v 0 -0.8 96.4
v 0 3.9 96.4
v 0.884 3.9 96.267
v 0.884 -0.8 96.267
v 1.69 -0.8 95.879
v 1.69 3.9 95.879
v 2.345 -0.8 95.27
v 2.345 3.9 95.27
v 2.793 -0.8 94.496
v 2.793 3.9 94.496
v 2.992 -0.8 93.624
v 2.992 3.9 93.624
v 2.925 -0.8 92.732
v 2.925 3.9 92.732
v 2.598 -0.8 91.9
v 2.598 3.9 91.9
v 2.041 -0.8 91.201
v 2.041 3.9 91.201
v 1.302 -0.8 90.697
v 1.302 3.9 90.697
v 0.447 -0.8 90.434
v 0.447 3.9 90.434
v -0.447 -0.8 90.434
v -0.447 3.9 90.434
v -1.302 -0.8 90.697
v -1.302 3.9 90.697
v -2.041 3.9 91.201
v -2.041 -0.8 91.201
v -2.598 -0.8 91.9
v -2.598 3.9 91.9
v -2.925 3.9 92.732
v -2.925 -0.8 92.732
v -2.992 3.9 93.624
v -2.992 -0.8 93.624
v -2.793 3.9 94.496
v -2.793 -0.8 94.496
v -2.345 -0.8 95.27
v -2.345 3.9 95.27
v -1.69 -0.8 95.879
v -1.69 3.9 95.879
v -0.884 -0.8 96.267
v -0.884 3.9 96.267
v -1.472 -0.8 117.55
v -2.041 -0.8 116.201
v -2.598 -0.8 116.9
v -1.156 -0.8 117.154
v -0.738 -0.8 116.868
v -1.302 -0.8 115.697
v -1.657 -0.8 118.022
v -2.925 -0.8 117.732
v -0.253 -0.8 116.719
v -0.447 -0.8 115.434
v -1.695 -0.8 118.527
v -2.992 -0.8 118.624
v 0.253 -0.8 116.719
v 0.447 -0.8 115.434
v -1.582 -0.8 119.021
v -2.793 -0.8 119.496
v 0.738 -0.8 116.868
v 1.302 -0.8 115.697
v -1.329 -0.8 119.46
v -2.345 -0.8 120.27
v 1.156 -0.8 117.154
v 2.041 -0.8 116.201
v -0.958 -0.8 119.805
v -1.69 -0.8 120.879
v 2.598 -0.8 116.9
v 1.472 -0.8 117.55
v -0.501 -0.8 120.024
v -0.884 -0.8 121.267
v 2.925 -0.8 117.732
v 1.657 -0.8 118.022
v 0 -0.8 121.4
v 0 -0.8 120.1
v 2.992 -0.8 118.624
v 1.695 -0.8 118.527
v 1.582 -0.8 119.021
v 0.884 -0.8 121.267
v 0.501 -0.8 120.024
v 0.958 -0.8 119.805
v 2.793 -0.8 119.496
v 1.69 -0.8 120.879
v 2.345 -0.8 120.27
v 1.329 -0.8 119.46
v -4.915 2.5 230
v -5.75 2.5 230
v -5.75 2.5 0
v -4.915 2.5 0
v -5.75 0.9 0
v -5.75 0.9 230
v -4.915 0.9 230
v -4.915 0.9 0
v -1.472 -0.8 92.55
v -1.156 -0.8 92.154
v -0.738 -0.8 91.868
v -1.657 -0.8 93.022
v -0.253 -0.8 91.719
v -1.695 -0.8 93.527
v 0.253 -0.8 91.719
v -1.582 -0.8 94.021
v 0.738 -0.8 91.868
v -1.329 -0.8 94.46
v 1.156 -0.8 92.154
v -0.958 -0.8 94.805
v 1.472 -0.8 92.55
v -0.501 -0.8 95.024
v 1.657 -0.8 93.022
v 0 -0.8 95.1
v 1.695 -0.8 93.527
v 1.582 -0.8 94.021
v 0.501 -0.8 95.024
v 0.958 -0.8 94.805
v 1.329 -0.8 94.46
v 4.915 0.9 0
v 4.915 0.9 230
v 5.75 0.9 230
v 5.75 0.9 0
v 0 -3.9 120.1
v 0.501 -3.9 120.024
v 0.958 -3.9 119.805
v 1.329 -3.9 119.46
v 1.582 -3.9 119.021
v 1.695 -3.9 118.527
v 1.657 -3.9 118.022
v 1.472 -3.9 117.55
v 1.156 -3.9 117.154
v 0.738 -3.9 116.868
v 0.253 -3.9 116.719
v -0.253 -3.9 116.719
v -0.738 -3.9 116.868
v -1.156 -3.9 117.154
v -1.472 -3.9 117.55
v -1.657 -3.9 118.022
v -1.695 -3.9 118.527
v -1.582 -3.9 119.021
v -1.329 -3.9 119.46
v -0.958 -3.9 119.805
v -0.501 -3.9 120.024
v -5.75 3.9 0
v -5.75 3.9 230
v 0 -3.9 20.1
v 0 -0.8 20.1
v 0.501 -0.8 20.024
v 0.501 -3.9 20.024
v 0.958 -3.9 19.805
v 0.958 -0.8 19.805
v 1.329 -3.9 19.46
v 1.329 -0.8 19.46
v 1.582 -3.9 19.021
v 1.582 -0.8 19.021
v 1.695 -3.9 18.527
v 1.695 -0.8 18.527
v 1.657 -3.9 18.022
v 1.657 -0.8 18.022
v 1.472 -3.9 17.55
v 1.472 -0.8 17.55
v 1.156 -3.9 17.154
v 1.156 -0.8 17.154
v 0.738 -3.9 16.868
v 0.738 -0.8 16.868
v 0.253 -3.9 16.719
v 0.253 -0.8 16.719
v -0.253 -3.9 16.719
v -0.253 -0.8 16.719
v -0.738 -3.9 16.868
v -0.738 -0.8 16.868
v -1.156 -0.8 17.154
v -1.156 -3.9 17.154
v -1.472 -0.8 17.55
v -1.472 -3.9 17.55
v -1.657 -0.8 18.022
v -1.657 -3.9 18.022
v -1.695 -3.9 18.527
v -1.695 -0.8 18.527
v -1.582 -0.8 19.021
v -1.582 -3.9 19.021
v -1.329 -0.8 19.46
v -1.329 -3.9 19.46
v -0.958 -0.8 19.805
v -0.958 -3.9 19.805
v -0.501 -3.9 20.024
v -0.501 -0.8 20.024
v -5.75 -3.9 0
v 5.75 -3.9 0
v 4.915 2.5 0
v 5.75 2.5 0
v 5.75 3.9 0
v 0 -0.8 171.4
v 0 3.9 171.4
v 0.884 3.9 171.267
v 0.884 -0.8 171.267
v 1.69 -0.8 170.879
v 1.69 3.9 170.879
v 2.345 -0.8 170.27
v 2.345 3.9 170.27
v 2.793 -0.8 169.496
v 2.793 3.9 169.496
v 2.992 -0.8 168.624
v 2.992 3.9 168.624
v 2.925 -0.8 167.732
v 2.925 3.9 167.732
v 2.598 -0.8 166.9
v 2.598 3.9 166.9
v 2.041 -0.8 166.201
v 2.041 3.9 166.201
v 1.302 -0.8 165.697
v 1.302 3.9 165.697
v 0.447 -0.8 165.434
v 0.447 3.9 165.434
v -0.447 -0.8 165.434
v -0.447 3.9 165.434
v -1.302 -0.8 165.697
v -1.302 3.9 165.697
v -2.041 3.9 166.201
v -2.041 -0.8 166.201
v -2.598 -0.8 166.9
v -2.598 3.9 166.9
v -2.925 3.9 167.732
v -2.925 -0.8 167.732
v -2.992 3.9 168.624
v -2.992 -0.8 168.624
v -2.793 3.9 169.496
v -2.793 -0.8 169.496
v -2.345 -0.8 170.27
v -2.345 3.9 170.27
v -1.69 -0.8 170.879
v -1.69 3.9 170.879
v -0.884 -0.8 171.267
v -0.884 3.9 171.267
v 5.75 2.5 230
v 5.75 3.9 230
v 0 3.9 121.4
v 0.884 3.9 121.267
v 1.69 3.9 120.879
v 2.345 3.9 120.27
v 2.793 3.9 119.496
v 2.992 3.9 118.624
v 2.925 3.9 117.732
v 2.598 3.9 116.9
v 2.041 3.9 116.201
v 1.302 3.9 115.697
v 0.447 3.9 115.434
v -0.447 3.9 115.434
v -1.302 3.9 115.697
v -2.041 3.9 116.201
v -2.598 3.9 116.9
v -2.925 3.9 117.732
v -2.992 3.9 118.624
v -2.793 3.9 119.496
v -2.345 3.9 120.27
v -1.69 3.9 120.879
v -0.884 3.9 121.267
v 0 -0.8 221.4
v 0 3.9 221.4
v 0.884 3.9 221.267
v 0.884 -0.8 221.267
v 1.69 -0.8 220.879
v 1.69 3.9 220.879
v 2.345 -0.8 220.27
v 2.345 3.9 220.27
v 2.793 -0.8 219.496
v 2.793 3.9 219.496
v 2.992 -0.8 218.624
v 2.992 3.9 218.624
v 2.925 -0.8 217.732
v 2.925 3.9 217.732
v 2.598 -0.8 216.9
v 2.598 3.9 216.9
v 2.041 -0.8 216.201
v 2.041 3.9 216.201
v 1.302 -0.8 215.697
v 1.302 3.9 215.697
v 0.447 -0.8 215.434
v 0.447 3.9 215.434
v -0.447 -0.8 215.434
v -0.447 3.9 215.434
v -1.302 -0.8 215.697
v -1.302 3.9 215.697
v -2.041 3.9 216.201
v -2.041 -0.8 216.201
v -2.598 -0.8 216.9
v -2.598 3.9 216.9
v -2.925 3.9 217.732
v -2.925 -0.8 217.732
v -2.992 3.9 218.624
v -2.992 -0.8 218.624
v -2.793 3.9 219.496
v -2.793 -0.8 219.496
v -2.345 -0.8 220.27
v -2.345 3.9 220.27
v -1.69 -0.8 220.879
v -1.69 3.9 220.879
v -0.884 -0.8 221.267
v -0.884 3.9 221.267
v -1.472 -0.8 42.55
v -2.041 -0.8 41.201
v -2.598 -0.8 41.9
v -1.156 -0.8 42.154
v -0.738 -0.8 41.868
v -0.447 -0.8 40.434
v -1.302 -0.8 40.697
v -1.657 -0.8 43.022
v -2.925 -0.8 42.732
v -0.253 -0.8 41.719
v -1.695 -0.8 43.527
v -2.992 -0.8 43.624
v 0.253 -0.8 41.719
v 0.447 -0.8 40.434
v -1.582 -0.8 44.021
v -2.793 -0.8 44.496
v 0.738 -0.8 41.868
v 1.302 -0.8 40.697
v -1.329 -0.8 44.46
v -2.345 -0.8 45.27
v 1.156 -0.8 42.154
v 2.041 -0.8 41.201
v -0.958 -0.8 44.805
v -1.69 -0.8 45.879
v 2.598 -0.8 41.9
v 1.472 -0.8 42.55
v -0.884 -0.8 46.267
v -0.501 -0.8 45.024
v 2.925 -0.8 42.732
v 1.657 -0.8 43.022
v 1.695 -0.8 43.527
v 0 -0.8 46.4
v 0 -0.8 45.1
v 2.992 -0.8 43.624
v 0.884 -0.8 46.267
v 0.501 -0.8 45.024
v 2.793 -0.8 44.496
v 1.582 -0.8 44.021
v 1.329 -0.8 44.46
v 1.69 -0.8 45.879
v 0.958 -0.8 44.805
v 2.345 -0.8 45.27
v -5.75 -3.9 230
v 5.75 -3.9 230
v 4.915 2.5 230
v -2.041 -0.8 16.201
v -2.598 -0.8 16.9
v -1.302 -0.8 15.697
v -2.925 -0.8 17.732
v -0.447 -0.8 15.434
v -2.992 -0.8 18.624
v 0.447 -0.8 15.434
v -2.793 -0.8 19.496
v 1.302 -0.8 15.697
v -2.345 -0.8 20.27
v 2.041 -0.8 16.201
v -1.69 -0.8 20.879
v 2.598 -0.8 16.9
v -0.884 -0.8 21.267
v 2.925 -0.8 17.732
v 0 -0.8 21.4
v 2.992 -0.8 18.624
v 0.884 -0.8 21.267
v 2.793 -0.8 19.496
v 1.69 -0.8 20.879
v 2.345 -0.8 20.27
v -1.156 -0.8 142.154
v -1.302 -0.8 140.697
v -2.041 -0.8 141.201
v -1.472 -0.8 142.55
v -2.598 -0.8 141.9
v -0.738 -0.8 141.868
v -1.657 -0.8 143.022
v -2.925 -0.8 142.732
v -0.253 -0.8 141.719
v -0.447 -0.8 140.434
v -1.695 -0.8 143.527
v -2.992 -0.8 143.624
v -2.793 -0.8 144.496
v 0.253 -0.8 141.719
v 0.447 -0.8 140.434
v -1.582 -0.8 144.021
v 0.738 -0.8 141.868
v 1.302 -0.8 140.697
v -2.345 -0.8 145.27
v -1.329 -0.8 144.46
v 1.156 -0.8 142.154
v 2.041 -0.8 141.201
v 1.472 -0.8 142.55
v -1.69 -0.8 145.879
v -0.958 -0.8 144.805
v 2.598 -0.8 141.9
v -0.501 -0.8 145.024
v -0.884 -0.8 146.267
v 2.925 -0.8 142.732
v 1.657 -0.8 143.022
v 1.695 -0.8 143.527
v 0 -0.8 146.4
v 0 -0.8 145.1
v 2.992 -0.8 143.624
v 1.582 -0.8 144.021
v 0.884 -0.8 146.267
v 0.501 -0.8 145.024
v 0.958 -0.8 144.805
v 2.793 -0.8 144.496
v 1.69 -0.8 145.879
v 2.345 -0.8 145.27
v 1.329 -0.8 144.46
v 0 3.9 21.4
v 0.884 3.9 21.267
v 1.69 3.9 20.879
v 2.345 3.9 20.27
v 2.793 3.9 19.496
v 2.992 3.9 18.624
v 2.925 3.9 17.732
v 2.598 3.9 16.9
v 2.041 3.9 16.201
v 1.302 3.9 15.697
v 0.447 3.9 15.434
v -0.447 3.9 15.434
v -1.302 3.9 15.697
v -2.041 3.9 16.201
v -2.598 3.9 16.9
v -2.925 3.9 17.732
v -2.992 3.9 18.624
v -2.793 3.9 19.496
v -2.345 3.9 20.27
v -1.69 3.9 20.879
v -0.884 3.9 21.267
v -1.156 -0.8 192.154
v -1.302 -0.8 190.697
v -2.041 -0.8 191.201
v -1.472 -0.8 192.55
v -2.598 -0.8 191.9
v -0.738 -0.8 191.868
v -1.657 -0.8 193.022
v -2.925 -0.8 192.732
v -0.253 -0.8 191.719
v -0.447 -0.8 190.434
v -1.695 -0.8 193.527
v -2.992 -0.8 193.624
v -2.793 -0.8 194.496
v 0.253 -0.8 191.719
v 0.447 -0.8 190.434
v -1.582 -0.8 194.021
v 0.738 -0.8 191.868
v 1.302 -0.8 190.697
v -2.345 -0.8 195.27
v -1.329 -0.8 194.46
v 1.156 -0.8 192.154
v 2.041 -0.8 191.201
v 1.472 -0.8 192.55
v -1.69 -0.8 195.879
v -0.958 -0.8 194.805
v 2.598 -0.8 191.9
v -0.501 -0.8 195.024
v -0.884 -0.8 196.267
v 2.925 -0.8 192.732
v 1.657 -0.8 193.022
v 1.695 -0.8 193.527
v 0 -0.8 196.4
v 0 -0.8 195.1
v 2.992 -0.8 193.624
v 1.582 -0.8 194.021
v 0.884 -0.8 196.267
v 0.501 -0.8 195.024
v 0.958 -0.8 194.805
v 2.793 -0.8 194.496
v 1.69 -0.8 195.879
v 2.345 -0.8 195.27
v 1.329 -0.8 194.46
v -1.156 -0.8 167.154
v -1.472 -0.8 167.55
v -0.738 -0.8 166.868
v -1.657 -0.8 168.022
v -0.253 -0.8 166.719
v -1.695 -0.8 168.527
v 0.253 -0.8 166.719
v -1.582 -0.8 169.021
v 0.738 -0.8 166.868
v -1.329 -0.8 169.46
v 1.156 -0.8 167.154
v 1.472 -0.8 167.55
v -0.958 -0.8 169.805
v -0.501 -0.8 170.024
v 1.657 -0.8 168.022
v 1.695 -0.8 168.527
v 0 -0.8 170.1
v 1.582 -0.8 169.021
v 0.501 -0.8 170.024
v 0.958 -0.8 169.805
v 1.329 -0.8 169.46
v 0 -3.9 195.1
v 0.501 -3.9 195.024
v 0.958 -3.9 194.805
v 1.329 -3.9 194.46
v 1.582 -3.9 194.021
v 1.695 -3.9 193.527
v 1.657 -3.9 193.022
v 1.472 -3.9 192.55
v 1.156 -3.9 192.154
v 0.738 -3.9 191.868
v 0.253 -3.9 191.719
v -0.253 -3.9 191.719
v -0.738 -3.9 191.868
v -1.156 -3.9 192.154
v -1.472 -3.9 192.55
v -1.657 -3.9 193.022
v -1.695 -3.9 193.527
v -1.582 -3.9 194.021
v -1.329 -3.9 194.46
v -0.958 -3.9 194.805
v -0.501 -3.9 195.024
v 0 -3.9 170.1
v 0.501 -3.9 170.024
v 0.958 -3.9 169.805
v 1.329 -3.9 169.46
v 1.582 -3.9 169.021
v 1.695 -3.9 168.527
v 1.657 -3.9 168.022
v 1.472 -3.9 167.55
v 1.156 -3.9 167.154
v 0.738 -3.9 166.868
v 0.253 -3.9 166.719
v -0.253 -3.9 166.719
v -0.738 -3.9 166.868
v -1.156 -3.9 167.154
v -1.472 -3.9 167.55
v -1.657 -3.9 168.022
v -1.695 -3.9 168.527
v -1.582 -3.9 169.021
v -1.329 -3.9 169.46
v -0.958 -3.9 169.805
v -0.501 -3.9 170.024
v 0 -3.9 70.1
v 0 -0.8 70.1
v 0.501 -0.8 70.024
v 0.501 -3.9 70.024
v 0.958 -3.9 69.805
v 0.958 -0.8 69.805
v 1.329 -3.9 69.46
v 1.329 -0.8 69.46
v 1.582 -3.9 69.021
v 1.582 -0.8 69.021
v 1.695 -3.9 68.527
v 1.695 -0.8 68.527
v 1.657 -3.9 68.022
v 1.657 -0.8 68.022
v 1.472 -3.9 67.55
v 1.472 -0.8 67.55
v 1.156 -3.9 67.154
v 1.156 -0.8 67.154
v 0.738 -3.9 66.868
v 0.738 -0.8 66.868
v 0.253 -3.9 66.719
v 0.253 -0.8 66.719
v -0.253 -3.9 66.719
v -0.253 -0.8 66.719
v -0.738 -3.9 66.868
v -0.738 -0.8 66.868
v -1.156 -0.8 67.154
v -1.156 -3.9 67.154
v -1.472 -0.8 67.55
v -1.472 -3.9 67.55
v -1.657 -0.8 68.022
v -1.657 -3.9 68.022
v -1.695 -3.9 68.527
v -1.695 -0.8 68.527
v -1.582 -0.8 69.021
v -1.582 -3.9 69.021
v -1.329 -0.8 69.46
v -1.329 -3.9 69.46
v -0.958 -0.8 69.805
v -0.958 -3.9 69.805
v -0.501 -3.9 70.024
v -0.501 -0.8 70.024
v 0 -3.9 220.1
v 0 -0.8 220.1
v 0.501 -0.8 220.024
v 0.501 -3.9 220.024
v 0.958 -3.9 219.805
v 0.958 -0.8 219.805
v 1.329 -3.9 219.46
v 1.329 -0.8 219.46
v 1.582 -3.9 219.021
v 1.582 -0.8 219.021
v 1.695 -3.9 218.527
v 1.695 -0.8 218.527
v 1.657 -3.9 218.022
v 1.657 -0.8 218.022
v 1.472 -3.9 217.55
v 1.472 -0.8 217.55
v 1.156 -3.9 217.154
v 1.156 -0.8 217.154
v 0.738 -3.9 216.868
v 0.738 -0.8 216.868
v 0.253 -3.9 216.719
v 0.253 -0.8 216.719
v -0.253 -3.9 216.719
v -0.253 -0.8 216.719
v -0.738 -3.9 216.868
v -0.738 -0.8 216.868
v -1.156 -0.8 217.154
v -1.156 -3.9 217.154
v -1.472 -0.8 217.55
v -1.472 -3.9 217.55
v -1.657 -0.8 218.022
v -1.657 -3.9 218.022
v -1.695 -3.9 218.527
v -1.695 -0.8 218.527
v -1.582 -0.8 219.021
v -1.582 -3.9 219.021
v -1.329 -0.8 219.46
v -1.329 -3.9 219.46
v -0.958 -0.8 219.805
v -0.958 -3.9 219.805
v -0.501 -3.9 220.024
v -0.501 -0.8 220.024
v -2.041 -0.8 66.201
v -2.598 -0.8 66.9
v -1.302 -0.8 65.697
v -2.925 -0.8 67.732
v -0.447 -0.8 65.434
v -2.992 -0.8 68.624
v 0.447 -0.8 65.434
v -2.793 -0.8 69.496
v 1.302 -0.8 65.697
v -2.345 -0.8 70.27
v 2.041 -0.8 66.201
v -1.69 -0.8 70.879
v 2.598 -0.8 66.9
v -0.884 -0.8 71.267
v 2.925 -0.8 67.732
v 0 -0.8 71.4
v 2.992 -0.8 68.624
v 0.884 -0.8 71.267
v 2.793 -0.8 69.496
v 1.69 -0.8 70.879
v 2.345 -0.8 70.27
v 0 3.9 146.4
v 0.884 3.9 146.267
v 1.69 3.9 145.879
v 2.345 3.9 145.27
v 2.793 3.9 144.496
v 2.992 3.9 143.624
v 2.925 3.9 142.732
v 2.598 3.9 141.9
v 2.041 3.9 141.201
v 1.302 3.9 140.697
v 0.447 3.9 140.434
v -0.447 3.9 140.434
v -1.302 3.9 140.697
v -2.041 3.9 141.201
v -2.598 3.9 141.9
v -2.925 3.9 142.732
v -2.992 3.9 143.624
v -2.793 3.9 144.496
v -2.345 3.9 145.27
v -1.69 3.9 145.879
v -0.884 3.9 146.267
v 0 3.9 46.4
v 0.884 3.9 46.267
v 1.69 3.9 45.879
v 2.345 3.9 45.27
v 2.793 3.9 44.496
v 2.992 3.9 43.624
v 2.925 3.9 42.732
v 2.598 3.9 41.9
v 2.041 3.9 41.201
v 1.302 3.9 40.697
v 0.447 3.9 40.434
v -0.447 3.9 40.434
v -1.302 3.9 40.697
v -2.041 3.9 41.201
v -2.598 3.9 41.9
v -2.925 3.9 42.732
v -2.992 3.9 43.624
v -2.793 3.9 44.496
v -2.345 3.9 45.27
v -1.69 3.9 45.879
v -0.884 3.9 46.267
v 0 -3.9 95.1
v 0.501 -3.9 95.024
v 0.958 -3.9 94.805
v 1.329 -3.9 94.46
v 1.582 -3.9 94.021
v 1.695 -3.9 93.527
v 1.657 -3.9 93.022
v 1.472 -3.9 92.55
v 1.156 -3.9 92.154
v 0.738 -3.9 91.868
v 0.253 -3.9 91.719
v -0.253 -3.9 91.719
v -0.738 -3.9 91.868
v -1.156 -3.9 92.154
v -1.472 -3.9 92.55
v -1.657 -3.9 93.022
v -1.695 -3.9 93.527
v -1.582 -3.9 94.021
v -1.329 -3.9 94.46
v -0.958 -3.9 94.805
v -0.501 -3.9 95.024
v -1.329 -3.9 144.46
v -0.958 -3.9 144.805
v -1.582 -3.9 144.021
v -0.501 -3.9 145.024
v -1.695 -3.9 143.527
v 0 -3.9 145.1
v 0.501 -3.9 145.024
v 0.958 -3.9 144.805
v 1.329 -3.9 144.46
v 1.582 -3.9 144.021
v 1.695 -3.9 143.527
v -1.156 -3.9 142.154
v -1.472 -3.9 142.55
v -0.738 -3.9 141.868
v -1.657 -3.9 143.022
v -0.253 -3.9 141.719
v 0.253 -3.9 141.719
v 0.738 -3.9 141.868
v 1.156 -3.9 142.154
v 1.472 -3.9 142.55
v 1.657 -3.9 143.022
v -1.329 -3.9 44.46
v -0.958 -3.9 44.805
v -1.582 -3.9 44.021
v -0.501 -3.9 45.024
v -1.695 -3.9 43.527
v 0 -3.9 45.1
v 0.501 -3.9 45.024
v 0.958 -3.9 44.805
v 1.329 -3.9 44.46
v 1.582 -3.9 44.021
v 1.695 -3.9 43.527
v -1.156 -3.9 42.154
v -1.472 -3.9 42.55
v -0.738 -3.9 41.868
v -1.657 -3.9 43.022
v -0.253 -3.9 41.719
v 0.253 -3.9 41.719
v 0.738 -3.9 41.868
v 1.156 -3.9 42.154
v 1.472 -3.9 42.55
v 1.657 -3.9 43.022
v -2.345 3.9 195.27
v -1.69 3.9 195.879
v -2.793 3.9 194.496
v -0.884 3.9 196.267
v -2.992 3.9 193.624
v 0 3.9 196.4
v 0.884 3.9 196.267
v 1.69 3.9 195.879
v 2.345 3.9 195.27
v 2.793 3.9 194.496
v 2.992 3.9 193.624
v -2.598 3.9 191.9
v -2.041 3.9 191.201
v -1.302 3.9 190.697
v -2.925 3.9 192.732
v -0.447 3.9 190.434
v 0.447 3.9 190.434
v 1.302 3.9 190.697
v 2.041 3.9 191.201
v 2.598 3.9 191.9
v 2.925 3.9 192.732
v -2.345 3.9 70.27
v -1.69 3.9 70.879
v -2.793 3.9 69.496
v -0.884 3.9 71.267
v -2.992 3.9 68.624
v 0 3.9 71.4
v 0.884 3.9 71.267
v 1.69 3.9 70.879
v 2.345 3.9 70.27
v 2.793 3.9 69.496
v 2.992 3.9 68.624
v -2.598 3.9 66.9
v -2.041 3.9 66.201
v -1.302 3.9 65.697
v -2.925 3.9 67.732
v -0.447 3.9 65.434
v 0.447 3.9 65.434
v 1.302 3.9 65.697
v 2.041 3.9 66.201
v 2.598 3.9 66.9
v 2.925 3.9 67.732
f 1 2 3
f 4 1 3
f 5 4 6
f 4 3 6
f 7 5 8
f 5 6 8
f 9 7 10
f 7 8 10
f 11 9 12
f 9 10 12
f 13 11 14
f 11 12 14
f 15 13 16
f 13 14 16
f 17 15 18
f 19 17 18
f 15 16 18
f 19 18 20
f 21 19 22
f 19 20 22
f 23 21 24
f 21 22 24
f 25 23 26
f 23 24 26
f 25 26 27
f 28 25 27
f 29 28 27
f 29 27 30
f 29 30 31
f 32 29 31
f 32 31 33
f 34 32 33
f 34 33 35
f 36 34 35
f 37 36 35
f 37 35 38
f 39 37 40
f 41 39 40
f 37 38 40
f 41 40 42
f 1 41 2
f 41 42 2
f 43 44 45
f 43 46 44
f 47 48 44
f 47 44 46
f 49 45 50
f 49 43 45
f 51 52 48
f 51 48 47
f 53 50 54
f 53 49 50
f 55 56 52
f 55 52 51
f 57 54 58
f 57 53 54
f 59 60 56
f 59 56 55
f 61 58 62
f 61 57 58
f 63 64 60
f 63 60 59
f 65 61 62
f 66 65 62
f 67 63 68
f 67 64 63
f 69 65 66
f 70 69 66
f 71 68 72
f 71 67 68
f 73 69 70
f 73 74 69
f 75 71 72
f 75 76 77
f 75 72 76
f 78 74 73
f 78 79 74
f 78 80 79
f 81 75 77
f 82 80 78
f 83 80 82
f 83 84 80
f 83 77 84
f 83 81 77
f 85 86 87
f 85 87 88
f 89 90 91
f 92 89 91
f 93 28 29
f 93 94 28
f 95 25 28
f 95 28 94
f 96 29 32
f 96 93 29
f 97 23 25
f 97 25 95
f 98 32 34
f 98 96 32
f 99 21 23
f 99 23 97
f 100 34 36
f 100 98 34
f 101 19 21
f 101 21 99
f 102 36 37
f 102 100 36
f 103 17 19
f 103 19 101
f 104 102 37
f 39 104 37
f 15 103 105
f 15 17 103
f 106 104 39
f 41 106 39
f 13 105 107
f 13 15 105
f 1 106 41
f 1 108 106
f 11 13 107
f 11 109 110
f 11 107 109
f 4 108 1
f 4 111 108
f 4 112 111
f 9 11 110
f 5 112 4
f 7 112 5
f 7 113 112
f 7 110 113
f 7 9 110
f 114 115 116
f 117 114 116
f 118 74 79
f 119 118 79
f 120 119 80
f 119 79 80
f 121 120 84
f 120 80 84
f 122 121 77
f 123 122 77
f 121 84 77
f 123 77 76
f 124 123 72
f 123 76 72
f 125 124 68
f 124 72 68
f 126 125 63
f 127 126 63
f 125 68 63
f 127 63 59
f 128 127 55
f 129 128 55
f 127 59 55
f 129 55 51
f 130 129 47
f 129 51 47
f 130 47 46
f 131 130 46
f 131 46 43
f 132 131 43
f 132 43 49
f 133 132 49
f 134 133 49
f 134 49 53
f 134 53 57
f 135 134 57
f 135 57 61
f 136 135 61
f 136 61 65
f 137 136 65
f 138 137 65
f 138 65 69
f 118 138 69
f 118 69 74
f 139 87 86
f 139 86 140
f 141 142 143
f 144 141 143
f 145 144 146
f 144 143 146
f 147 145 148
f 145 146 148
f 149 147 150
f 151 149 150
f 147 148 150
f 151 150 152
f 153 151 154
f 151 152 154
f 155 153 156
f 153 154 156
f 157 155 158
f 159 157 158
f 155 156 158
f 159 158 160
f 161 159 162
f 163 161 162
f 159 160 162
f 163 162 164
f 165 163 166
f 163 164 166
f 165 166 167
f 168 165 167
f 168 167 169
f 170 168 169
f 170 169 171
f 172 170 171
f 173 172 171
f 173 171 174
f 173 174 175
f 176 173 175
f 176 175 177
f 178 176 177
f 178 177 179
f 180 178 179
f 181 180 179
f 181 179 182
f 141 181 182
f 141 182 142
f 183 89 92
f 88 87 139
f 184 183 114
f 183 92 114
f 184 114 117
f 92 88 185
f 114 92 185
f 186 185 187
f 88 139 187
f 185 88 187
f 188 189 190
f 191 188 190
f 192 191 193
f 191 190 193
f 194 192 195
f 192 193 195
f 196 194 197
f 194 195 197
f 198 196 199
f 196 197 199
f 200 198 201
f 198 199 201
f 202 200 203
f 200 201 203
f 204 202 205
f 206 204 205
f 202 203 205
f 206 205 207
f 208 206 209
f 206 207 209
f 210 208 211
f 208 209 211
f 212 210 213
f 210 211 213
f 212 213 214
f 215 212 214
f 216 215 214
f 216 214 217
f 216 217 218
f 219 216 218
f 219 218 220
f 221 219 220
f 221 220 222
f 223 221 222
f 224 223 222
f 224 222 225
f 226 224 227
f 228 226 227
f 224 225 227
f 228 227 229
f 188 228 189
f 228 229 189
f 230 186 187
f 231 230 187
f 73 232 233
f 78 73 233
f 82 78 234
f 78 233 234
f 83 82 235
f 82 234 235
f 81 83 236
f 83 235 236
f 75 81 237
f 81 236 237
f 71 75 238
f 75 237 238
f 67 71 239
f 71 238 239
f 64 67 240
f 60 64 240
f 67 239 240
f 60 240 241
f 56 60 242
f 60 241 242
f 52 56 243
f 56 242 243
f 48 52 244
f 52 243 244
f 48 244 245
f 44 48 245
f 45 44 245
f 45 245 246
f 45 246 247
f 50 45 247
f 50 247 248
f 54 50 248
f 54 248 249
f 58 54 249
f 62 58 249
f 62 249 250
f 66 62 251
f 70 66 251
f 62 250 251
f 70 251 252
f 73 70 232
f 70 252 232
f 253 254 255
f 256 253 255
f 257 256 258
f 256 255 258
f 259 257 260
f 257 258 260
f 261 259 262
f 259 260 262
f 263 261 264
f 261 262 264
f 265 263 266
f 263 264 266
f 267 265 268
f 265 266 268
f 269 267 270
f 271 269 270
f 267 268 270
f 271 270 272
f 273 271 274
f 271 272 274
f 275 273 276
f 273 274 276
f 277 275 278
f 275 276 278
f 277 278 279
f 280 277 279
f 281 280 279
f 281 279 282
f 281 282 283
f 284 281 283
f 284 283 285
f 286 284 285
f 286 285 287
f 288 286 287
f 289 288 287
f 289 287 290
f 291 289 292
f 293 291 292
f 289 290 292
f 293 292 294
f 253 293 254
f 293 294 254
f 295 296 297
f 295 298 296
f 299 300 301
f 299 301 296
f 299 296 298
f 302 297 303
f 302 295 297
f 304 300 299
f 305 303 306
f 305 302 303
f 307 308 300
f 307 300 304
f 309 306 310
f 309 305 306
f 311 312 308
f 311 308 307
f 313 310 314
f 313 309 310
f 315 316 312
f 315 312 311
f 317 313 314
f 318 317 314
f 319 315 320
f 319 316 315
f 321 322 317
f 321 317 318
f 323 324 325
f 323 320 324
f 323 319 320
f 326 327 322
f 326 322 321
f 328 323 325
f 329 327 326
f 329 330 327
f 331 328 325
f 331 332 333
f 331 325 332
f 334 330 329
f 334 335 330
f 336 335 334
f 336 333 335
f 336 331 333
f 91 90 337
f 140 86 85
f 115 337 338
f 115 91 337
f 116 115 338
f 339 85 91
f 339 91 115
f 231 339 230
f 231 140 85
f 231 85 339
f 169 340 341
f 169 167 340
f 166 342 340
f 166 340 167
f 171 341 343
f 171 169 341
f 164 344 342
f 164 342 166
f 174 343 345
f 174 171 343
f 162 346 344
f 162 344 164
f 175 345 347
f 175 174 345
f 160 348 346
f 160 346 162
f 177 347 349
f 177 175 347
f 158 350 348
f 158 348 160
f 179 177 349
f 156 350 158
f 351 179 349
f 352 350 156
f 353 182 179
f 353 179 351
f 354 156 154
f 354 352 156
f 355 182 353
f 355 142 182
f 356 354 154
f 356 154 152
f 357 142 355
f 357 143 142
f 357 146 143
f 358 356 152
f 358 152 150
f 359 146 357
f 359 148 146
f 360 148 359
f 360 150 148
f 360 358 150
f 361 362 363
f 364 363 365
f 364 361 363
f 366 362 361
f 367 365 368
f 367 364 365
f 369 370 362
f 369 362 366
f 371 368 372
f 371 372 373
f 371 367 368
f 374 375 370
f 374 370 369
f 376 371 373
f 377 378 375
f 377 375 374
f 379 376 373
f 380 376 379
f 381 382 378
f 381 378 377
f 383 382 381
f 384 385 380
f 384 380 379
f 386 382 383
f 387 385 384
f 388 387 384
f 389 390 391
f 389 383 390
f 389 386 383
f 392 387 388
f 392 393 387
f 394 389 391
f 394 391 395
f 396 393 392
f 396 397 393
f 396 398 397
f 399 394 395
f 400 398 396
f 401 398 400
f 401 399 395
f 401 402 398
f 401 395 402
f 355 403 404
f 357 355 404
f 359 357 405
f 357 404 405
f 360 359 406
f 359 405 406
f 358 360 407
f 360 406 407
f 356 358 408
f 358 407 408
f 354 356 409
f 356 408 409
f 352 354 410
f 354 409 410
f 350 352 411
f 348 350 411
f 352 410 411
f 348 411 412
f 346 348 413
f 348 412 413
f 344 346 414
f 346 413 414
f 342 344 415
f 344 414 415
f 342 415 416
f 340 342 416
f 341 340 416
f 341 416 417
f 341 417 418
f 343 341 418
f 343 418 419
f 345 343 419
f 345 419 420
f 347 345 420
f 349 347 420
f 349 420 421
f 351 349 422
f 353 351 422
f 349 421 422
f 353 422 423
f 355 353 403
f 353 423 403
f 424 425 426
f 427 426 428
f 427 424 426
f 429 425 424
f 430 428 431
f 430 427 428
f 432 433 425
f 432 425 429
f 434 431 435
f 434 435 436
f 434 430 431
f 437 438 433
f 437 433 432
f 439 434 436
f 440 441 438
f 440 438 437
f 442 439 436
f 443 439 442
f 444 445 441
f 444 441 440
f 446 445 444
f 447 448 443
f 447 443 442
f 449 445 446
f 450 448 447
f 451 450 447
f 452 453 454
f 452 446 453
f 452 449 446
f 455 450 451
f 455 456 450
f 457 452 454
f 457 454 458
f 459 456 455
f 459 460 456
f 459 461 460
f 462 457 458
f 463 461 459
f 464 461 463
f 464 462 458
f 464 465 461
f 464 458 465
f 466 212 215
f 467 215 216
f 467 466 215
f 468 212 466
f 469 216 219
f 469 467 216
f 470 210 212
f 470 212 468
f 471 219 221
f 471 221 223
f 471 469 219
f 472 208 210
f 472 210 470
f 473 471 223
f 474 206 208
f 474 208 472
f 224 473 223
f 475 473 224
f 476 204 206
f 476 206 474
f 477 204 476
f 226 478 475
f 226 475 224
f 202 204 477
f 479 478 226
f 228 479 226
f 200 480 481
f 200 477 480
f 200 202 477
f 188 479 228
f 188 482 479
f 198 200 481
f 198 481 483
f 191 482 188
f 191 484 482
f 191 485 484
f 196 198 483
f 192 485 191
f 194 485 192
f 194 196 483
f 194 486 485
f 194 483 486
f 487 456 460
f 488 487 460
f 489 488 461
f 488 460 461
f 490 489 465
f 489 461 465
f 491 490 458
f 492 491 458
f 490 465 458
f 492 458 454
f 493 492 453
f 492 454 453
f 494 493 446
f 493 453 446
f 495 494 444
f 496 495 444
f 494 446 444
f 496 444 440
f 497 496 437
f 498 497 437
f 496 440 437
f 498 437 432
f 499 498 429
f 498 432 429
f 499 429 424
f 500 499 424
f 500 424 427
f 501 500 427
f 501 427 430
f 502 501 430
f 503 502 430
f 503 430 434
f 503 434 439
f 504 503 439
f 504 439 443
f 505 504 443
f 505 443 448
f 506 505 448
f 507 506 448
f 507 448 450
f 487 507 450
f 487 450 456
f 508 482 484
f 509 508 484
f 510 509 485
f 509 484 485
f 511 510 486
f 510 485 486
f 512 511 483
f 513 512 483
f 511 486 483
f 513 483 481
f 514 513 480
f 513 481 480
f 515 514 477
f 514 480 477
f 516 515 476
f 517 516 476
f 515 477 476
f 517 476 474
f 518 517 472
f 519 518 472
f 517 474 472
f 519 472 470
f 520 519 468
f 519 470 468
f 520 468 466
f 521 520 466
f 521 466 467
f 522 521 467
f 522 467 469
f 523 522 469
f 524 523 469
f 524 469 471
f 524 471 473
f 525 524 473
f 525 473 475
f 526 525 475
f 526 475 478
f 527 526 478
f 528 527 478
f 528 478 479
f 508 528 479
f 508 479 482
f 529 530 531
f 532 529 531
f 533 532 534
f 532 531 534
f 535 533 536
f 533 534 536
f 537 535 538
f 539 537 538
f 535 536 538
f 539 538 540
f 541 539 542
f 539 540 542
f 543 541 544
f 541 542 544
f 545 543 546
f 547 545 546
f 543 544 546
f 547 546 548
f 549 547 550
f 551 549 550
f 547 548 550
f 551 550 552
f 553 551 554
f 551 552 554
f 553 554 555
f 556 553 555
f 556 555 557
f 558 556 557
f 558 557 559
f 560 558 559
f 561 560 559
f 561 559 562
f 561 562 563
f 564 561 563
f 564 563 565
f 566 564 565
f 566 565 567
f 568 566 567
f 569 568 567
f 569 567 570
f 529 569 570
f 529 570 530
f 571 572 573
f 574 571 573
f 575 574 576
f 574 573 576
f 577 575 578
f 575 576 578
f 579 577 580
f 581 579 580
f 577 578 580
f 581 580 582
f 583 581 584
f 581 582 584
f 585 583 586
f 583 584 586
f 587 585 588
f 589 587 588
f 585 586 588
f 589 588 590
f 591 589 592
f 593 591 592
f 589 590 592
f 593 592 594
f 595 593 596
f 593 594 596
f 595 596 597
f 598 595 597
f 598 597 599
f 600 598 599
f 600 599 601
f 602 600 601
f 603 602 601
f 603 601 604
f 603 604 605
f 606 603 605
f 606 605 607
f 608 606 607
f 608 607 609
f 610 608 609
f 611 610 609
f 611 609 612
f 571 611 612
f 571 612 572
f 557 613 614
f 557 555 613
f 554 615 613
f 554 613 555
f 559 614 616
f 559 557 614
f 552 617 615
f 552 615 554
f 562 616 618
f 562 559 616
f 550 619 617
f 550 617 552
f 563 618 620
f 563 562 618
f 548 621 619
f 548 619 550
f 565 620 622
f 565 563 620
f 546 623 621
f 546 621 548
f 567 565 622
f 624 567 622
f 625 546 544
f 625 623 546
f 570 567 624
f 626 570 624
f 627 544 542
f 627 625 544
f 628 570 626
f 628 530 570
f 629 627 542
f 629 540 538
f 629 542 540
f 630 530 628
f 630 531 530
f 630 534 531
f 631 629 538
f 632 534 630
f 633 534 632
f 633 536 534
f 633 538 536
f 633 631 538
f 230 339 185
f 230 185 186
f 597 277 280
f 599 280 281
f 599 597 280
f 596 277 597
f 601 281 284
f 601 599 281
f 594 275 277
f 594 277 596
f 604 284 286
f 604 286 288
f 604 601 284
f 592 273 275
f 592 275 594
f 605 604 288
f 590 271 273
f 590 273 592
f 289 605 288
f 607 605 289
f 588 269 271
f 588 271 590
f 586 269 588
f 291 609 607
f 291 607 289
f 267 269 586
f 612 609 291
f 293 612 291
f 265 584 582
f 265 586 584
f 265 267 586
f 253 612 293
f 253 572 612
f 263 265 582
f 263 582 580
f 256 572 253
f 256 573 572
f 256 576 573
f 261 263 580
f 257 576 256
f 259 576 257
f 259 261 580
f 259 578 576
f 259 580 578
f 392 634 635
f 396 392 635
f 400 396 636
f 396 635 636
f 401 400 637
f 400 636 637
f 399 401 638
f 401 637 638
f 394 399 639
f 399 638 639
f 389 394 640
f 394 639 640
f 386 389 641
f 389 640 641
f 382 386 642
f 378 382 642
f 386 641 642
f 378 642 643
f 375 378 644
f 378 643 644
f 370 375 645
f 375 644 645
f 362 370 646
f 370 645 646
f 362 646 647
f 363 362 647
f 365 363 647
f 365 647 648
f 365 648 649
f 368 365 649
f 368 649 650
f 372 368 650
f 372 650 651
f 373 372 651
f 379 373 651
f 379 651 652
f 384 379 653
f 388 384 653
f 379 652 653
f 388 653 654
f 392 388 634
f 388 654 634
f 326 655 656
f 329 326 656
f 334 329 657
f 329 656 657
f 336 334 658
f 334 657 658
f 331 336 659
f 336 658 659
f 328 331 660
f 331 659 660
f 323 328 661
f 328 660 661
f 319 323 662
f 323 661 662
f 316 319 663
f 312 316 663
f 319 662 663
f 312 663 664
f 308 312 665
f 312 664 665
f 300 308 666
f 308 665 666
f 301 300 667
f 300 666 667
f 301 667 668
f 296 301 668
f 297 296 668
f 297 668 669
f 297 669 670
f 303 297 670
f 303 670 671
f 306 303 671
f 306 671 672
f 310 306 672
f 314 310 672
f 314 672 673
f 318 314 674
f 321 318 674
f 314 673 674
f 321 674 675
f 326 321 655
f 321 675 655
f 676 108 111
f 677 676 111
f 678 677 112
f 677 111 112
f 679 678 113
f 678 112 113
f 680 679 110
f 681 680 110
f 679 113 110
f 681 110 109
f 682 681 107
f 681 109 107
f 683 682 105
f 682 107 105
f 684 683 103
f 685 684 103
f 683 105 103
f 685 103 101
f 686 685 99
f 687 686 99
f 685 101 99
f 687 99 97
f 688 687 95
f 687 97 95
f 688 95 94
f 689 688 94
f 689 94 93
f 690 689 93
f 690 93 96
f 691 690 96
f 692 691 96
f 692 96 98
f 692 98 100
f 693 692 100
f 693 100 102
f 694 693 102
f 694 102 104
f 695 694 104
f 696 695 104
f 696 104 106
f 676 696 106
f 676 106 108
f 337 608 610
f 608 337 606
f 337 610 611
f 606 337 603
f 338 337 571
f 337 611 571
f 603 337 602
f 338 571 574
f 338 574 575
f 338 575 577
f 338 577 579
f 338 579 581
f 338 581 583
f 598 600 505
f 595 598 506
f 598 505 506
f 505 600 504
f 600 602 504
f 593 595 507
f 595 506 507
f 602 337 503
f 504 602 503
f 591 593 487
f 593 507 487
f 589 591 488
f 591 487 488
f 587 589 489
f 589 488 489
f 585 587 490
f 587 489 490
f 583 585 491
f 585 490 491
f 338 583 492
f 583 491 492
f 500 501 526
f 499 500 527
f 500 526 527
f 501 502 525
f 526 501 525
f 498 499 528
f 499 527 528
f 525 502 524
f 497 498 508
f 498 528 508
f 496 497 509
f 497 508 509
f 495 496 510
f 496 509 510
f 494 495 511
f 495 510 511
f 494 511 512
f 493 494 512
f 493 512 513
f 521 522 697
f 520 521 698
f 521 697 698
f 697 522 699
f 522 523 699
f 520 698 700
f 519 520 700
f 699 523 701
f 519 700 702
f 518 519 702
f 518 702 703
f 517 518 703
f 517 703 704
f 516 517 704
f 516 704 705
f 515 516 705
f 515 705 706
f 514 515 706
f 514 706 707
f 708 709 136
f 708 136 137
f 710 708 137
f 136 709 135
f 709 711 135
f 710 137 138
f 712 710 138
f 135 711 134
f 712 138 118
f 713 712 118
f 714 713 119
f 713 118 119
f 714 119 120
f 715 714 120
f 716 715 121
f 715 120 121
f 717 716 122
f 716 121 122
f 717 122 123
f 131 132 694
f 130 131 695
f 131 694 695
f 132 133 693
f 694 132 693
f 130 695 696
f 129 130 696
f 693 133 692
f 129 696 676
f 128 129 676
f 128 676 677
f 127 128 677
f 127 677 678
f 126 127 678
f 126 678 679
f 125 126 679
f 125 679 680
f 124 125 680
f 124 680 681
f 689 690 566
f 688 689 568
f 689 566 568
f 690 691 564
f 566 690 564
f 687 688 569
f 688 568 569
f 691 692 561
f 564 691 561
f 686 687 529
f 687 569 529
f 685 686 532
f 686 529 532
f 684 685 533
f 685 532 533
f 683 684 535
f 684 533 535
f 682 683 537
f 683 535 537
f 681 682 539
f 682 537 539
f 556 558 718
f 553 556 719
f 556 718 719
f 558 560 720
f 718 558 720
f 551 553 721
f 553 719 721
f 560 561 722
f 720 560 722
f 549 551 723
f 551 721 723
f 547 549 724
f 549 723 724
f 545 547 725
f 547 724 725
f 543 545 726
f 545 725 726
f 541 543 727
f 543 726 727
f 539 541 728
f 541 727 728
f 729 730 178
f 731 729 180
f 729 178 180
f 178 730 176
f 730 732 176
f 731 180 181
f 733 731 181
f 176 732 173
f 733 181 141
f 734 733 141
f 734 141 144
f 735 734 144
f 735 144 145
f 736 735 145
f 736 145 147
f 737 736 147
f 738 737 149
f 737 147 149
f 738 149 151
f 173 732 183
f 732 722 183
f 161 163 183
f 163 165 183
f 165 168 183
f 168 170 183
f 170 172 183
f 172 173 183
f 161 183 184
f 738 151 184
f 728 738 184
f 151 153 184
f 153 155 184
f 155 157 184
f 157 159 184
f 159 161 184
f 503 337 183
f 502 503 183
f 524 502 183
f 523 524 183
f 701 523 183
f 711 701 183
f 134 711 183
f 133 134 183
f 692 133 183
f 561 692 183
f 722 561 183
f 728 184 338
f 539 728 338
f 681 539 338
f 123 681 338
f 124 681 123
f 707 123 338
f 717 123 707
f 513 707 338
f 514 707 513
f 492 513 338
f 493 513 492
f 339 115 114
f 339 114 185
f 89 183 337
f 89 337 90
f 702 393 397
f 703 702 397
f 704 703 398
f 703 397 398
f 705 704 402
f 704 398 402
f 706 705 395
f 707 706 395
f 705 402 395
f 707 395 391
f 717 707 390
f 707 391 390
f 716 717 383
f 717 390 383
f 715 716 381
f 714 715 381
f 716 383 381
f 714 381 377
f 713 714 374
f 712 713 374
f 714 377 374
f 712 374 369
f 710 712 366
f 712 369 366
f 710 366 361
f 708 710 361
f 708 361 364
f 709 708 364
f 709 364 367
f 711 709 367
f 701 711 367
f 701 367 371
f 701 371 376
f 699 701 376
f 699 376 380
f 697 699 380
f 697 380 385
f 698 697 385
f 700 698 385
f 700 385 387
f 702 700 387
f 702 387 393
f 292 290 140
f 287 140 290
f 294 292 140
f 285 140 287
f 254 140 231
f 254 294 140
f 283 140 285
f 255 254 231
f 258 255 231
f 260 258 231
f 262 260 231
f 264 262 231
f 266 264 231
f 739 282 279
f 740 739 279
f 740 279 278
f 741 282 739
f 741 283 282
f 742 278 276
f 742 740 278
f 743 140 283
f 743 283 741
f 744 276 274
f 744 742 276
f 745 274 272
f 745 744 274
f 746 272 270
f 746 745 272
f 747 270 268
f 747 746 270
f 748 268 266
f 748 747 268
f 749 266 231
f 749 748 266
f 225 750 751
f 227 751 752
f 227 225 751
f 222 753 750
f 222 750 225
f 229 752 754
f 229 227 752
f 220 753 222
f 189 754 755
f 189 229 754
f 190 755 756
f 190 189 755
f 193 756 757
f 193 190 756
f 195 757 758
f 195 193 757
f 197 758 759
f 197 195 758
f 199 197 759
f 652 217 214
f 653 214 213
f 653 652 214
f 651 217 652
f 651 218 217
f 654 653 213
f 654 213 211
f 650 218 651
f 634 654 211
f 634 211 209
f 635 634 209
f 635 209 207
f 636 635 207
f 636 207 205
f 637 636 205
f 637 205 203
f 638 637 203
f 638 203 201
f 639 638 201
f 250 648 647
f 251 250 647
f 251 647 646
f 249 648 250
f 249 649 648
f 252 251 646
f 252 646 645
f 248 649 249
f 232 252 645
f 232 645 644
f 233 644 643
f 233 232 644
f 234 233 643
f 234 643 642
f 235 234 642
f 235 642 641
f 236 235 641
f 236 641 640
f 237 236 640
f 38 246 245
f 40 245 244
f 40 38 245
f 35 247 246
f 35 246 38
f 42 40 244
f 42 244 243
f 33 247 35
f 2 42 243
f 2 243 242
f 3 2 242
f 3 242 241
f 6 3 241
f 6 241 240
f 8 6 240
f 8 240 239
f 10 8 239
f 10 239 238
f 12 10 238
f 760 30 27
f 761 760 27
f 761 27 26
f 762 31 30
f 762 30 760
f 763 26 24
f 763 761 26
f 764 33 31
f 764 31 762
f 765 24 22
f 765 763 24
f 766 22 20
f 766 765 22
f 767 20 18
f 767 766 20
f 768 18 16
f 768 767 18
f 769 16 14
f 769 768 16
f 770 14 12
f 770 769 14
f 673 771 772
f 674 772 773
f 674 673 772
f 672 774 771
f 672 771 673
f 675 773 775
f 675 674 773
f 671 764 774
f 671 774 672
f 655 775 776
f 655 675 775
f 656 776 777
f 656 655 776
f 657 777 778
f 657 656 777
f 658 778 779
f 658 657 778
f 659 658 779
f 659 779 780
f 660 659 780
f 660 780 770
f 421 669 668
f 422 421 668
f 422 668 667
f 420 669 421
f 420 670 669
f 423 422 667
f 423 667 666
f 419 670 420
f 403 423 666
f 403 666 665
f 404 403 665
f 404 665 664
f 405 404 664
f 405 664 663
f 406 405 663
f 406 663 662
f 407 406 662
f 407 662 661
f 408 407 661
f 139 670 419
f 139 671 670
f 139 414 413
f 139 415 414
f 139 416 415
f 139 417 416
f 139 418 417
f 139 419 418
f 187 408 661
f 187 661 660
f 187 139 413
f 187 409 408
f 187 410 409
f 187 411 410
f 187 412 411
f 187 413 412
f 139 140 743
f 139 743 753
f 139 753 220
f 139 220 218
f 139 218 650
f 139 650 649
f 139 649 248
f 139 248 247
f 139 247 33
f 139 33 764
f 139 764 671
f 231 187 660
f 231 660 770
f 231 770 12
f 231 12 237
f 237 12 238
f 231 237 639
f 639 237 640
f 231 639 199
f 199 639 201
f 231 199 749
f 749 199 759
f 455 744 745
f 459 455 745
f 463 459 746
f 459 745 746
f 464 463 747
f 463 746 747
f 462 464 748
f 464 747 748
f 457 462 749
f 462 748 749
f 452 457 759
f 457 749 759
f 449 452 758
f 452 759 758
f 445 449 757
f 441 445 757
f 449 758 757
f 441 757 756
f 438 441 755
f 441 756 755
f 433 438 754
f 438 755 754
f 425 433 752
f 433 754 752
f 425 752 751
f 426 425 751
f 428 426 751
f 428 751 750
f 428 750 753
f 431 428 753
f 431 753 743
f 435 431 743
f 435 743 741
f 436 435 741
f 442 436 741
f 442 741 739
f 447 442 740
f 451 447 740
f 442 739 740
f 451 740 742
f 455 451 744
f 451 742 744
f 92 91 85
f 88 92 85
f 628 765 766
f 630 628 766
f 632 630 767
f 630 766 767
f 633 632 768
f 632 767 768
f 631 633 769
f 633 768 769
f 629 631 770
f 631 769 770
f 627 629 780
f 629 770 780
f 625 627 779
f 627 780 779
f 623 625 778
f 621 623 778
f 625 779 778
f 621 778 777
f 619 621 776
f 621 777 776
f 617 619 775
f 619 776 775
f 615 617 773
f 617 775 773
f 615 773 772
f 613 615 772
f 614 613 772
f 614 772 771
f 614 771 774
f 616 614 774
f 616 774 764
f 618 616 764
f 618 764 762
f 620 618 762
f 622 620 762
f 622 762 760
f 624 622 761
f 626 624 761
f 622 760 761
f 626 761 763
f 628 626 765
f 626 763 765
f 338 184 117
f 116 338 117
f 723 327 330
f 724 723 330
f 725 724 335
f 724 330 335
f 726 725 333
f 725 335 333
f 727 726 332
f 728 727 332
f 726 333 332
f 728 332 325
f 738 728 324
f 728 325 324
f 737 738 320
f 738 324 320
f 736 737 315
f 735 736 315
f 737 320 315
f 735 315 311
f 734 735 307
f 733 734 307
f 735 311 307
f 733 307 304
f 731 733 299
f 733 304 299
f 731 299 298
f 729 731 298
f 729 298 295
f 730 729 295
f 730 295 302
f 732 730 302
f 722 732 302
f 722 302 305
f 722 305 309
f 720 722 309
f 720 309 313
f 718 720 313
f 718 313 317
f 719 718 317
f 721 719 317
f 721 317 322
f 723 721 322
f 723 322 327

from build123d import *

# Parameters (mm, degrees)
SKETCH1_W           = 11.5
SKETCH1_H           = 7.8
BOSS_EXTRUDE1_DEPTH = 230
SKETCH2_W           = 0.835250229
SKETCH2_H           = 1.6
CUT_EXTRUDE1_DEPTH  = 231.104916288
SKETCH3_R           = 3
CUT_EXTRUDE2_DEPTH  = 4.7
SKETCH4_R           = 1.7
CUT_EXTRUDE3_DEPTH  = 231.119865505


with BuildPart() as part:
    # Sketch1 → Boss-Extrude1 (new body)
    with BuildSketch(Plane.XY):
        Rectangle(SKETCH1_W, SKETCH1_H)
    extrude(amount=BOSS_EXTRUDE1_DEPTH)

    # Sketch2 → Cut-Extrude1 (cut, through all)
    with BuildSketch(Plane.XY.offset(230)):
        with Locations((5.332374886, 1.7)):
            Rectangle(SKETCH2_W, SKETCH2_H)
        with Locations((-5.332374886, 1.7)):
            Rectangle(SKETCH2_W, SKETCH2_H)
    extrude(amount=-CUT_EXTRUDE1_DEPTH, mode=Mode.SUBTRACT)

    # Sketch3 → Cut-Extrude2 (cut)
    with BuildSketch(Plane(origin=(0, 3.9, 0), x_dir=(1, 0, 0), z_dir=(0, 1, 0))):
        with Locations(Location((0, -218.4, 0), (0, 0, 270))):
            Circle(SKETCH3_R)
        with Locations(Location((0, -193.4, 0), (0, 0, 270))):
            Circle(SKETCH3_R)
        with Locations(Location((0, -168.4, 0), (0, 0, 270))):
            Circle(SKETCH3_R)
        with Locations(Location((0, -143.4, 0), (0, 0, 270))):
            Circle(SKETCH3_R)
        with Locations(Location((0, -118.4, 0), (0, 0, 270))):
            Circle(SKETCH3_R)
        with Locations(Location((0, -93.4, 0), (0, 0, 270))):
            Circle(SKETCH3_R)
        with Locations(Location((0, -68.4, 0), (0, 0, 270))):
            Circle(SKETCH3_R)
        with Locations(Location((0, -43.4, 0), (0, 0, 270))):
            Circle(SKETCH3_R)
        with Locations(Location((0, -18.4, 0), (0, 0, 270))):
            Circle(SKETCH3_R)
        with Locations((0, 6.6)):
            Circle(SKETCH3_R)
        with Locations((0, 31.6)):
            Circle(SKETCH3_R)
        with Locations((0, 56.6)):
            Circle(SKETCH3_R)
        with Locations((0, 81.6)):
            Circle(SKETCH3_R)
        with Locations((0, 106.6)):
            Circle(SKETCH3_R)
        with Locations((0, 131.6)):
            Circle(SKETCH3_R)
        with Locations((0, 156.6)):
            Circle(SKETCH3_R)
        with Locations((0, 181.6)):
            Circle(SKETCH3_R)
        with Locations((0, 206.6)):
            Circle(SKETCH3_R)
        with Locations((0, 231.6)):
            Circle(SKETCH3_R)
        with Locations((0, 256.6)):
            Circle(SKETCH3_R)
        with Locations((0, 281.6)):
            Circle(SKETCH3_R)
        with Locations((0, 306.6)):
            Circle(SKETCH3_R)
        with Locations((0, 331.6)):
            Circle(SKETCH3_R)
        with Locations((0, 356.6)):
            Circle(SKETCH3_R)
        with Locations((0, 381.6)):
            Circle(SKETCH3_R)
    extrude(amount=-CUT_EXTRUDE2_DEPTH, mode=Mode.SUBTRACT)

    # Sketch4 → Cut-Extrude3 (cut, through all)
    with BuildSketch(Plane(origin=(0, -0.8, 0), x_dir=(1, 0, 0), z_dir=(0, 1, 0))):
        with Locations(Location((0, -218.4, 0), (0, 0, 270))):
            Circle(SKETCH4_R)
        with Locations(Location((0, -193.4, 0), (0, 0, 270))):
            Circle(SKETCH4_R)
        with Locations(Location((0, -168.4, 0), (0, 0, 270))):
            Circle(SKETCH4_R)
        with Locations(Location((0, -143.4, 0), (0, 0, 270))):
            Circle(SKETCH4_R)
        with Locations(Location((0, -118.4, 0), (0, 0, 270))):
            Circle(SKETCH4_R)
        with Locations(Location((0, -93.4, 0), (0, 0, 270))):
            Circle(SKETCH4_R)
        with Locations(Location((0, -68.4, 0), (0, 0, 270))):
            Circle(SKETCH4_R)
        with Locations(Location((0, -43.4, 0), (0, 0, 270))):
            Circle(SKETCH4_R)
        with Locations(Location((0, -18.4, 0), (0, 0, 270))):
            Circle(SKETCH4_R)
        with Locations((0, 6.6)):
            Circle(SKETCH4_R)
        with Locations((0, 31.6)):
            Circle(SKETCH4_R)
        with Locations((0, 56.6)):
            Circle(SKETCH4_R)
        with Locations((0, 81.6)):
            Circle(SKETCH4_R)
        with Locations((0, 106.6)):
            Circle(SKETCH4_R)
        with Locations((0, 131.6)):
            Circle(SKETCH4_R)
        with Locations((0, 156.6)):
            Circle(SKETCH4_R)
        with Locations((0, 181.6)):
            Circle(SKETCH4_R)
        with Locations((0, 206.6)):
            Circle(SKETCH4_R)
        with Locations((0, 231.6)):
            Circle(SKETCH4_R)
        with Locations((0, 256.6)):
            Circle(SKETCH4_R)
        with Locations((0, 281.6)):
            Circle(SKETCH4_R)
        with Locations((0, 306.6)):
            Circle(SKETCH4_R)
        with Locations((0, 331.6)):
            Circle(SKETCH4_R)
        with Locations((0, 356.6)):
            Circle(SKETCH4_R)
        with Locations((0, 381.6)):
            Circle(SKETCH4_R)
    extrude(amount=-CUT_EXTRUDE3_DEPTH, mode=Mode.SUBTRACT)


solid = part.part
